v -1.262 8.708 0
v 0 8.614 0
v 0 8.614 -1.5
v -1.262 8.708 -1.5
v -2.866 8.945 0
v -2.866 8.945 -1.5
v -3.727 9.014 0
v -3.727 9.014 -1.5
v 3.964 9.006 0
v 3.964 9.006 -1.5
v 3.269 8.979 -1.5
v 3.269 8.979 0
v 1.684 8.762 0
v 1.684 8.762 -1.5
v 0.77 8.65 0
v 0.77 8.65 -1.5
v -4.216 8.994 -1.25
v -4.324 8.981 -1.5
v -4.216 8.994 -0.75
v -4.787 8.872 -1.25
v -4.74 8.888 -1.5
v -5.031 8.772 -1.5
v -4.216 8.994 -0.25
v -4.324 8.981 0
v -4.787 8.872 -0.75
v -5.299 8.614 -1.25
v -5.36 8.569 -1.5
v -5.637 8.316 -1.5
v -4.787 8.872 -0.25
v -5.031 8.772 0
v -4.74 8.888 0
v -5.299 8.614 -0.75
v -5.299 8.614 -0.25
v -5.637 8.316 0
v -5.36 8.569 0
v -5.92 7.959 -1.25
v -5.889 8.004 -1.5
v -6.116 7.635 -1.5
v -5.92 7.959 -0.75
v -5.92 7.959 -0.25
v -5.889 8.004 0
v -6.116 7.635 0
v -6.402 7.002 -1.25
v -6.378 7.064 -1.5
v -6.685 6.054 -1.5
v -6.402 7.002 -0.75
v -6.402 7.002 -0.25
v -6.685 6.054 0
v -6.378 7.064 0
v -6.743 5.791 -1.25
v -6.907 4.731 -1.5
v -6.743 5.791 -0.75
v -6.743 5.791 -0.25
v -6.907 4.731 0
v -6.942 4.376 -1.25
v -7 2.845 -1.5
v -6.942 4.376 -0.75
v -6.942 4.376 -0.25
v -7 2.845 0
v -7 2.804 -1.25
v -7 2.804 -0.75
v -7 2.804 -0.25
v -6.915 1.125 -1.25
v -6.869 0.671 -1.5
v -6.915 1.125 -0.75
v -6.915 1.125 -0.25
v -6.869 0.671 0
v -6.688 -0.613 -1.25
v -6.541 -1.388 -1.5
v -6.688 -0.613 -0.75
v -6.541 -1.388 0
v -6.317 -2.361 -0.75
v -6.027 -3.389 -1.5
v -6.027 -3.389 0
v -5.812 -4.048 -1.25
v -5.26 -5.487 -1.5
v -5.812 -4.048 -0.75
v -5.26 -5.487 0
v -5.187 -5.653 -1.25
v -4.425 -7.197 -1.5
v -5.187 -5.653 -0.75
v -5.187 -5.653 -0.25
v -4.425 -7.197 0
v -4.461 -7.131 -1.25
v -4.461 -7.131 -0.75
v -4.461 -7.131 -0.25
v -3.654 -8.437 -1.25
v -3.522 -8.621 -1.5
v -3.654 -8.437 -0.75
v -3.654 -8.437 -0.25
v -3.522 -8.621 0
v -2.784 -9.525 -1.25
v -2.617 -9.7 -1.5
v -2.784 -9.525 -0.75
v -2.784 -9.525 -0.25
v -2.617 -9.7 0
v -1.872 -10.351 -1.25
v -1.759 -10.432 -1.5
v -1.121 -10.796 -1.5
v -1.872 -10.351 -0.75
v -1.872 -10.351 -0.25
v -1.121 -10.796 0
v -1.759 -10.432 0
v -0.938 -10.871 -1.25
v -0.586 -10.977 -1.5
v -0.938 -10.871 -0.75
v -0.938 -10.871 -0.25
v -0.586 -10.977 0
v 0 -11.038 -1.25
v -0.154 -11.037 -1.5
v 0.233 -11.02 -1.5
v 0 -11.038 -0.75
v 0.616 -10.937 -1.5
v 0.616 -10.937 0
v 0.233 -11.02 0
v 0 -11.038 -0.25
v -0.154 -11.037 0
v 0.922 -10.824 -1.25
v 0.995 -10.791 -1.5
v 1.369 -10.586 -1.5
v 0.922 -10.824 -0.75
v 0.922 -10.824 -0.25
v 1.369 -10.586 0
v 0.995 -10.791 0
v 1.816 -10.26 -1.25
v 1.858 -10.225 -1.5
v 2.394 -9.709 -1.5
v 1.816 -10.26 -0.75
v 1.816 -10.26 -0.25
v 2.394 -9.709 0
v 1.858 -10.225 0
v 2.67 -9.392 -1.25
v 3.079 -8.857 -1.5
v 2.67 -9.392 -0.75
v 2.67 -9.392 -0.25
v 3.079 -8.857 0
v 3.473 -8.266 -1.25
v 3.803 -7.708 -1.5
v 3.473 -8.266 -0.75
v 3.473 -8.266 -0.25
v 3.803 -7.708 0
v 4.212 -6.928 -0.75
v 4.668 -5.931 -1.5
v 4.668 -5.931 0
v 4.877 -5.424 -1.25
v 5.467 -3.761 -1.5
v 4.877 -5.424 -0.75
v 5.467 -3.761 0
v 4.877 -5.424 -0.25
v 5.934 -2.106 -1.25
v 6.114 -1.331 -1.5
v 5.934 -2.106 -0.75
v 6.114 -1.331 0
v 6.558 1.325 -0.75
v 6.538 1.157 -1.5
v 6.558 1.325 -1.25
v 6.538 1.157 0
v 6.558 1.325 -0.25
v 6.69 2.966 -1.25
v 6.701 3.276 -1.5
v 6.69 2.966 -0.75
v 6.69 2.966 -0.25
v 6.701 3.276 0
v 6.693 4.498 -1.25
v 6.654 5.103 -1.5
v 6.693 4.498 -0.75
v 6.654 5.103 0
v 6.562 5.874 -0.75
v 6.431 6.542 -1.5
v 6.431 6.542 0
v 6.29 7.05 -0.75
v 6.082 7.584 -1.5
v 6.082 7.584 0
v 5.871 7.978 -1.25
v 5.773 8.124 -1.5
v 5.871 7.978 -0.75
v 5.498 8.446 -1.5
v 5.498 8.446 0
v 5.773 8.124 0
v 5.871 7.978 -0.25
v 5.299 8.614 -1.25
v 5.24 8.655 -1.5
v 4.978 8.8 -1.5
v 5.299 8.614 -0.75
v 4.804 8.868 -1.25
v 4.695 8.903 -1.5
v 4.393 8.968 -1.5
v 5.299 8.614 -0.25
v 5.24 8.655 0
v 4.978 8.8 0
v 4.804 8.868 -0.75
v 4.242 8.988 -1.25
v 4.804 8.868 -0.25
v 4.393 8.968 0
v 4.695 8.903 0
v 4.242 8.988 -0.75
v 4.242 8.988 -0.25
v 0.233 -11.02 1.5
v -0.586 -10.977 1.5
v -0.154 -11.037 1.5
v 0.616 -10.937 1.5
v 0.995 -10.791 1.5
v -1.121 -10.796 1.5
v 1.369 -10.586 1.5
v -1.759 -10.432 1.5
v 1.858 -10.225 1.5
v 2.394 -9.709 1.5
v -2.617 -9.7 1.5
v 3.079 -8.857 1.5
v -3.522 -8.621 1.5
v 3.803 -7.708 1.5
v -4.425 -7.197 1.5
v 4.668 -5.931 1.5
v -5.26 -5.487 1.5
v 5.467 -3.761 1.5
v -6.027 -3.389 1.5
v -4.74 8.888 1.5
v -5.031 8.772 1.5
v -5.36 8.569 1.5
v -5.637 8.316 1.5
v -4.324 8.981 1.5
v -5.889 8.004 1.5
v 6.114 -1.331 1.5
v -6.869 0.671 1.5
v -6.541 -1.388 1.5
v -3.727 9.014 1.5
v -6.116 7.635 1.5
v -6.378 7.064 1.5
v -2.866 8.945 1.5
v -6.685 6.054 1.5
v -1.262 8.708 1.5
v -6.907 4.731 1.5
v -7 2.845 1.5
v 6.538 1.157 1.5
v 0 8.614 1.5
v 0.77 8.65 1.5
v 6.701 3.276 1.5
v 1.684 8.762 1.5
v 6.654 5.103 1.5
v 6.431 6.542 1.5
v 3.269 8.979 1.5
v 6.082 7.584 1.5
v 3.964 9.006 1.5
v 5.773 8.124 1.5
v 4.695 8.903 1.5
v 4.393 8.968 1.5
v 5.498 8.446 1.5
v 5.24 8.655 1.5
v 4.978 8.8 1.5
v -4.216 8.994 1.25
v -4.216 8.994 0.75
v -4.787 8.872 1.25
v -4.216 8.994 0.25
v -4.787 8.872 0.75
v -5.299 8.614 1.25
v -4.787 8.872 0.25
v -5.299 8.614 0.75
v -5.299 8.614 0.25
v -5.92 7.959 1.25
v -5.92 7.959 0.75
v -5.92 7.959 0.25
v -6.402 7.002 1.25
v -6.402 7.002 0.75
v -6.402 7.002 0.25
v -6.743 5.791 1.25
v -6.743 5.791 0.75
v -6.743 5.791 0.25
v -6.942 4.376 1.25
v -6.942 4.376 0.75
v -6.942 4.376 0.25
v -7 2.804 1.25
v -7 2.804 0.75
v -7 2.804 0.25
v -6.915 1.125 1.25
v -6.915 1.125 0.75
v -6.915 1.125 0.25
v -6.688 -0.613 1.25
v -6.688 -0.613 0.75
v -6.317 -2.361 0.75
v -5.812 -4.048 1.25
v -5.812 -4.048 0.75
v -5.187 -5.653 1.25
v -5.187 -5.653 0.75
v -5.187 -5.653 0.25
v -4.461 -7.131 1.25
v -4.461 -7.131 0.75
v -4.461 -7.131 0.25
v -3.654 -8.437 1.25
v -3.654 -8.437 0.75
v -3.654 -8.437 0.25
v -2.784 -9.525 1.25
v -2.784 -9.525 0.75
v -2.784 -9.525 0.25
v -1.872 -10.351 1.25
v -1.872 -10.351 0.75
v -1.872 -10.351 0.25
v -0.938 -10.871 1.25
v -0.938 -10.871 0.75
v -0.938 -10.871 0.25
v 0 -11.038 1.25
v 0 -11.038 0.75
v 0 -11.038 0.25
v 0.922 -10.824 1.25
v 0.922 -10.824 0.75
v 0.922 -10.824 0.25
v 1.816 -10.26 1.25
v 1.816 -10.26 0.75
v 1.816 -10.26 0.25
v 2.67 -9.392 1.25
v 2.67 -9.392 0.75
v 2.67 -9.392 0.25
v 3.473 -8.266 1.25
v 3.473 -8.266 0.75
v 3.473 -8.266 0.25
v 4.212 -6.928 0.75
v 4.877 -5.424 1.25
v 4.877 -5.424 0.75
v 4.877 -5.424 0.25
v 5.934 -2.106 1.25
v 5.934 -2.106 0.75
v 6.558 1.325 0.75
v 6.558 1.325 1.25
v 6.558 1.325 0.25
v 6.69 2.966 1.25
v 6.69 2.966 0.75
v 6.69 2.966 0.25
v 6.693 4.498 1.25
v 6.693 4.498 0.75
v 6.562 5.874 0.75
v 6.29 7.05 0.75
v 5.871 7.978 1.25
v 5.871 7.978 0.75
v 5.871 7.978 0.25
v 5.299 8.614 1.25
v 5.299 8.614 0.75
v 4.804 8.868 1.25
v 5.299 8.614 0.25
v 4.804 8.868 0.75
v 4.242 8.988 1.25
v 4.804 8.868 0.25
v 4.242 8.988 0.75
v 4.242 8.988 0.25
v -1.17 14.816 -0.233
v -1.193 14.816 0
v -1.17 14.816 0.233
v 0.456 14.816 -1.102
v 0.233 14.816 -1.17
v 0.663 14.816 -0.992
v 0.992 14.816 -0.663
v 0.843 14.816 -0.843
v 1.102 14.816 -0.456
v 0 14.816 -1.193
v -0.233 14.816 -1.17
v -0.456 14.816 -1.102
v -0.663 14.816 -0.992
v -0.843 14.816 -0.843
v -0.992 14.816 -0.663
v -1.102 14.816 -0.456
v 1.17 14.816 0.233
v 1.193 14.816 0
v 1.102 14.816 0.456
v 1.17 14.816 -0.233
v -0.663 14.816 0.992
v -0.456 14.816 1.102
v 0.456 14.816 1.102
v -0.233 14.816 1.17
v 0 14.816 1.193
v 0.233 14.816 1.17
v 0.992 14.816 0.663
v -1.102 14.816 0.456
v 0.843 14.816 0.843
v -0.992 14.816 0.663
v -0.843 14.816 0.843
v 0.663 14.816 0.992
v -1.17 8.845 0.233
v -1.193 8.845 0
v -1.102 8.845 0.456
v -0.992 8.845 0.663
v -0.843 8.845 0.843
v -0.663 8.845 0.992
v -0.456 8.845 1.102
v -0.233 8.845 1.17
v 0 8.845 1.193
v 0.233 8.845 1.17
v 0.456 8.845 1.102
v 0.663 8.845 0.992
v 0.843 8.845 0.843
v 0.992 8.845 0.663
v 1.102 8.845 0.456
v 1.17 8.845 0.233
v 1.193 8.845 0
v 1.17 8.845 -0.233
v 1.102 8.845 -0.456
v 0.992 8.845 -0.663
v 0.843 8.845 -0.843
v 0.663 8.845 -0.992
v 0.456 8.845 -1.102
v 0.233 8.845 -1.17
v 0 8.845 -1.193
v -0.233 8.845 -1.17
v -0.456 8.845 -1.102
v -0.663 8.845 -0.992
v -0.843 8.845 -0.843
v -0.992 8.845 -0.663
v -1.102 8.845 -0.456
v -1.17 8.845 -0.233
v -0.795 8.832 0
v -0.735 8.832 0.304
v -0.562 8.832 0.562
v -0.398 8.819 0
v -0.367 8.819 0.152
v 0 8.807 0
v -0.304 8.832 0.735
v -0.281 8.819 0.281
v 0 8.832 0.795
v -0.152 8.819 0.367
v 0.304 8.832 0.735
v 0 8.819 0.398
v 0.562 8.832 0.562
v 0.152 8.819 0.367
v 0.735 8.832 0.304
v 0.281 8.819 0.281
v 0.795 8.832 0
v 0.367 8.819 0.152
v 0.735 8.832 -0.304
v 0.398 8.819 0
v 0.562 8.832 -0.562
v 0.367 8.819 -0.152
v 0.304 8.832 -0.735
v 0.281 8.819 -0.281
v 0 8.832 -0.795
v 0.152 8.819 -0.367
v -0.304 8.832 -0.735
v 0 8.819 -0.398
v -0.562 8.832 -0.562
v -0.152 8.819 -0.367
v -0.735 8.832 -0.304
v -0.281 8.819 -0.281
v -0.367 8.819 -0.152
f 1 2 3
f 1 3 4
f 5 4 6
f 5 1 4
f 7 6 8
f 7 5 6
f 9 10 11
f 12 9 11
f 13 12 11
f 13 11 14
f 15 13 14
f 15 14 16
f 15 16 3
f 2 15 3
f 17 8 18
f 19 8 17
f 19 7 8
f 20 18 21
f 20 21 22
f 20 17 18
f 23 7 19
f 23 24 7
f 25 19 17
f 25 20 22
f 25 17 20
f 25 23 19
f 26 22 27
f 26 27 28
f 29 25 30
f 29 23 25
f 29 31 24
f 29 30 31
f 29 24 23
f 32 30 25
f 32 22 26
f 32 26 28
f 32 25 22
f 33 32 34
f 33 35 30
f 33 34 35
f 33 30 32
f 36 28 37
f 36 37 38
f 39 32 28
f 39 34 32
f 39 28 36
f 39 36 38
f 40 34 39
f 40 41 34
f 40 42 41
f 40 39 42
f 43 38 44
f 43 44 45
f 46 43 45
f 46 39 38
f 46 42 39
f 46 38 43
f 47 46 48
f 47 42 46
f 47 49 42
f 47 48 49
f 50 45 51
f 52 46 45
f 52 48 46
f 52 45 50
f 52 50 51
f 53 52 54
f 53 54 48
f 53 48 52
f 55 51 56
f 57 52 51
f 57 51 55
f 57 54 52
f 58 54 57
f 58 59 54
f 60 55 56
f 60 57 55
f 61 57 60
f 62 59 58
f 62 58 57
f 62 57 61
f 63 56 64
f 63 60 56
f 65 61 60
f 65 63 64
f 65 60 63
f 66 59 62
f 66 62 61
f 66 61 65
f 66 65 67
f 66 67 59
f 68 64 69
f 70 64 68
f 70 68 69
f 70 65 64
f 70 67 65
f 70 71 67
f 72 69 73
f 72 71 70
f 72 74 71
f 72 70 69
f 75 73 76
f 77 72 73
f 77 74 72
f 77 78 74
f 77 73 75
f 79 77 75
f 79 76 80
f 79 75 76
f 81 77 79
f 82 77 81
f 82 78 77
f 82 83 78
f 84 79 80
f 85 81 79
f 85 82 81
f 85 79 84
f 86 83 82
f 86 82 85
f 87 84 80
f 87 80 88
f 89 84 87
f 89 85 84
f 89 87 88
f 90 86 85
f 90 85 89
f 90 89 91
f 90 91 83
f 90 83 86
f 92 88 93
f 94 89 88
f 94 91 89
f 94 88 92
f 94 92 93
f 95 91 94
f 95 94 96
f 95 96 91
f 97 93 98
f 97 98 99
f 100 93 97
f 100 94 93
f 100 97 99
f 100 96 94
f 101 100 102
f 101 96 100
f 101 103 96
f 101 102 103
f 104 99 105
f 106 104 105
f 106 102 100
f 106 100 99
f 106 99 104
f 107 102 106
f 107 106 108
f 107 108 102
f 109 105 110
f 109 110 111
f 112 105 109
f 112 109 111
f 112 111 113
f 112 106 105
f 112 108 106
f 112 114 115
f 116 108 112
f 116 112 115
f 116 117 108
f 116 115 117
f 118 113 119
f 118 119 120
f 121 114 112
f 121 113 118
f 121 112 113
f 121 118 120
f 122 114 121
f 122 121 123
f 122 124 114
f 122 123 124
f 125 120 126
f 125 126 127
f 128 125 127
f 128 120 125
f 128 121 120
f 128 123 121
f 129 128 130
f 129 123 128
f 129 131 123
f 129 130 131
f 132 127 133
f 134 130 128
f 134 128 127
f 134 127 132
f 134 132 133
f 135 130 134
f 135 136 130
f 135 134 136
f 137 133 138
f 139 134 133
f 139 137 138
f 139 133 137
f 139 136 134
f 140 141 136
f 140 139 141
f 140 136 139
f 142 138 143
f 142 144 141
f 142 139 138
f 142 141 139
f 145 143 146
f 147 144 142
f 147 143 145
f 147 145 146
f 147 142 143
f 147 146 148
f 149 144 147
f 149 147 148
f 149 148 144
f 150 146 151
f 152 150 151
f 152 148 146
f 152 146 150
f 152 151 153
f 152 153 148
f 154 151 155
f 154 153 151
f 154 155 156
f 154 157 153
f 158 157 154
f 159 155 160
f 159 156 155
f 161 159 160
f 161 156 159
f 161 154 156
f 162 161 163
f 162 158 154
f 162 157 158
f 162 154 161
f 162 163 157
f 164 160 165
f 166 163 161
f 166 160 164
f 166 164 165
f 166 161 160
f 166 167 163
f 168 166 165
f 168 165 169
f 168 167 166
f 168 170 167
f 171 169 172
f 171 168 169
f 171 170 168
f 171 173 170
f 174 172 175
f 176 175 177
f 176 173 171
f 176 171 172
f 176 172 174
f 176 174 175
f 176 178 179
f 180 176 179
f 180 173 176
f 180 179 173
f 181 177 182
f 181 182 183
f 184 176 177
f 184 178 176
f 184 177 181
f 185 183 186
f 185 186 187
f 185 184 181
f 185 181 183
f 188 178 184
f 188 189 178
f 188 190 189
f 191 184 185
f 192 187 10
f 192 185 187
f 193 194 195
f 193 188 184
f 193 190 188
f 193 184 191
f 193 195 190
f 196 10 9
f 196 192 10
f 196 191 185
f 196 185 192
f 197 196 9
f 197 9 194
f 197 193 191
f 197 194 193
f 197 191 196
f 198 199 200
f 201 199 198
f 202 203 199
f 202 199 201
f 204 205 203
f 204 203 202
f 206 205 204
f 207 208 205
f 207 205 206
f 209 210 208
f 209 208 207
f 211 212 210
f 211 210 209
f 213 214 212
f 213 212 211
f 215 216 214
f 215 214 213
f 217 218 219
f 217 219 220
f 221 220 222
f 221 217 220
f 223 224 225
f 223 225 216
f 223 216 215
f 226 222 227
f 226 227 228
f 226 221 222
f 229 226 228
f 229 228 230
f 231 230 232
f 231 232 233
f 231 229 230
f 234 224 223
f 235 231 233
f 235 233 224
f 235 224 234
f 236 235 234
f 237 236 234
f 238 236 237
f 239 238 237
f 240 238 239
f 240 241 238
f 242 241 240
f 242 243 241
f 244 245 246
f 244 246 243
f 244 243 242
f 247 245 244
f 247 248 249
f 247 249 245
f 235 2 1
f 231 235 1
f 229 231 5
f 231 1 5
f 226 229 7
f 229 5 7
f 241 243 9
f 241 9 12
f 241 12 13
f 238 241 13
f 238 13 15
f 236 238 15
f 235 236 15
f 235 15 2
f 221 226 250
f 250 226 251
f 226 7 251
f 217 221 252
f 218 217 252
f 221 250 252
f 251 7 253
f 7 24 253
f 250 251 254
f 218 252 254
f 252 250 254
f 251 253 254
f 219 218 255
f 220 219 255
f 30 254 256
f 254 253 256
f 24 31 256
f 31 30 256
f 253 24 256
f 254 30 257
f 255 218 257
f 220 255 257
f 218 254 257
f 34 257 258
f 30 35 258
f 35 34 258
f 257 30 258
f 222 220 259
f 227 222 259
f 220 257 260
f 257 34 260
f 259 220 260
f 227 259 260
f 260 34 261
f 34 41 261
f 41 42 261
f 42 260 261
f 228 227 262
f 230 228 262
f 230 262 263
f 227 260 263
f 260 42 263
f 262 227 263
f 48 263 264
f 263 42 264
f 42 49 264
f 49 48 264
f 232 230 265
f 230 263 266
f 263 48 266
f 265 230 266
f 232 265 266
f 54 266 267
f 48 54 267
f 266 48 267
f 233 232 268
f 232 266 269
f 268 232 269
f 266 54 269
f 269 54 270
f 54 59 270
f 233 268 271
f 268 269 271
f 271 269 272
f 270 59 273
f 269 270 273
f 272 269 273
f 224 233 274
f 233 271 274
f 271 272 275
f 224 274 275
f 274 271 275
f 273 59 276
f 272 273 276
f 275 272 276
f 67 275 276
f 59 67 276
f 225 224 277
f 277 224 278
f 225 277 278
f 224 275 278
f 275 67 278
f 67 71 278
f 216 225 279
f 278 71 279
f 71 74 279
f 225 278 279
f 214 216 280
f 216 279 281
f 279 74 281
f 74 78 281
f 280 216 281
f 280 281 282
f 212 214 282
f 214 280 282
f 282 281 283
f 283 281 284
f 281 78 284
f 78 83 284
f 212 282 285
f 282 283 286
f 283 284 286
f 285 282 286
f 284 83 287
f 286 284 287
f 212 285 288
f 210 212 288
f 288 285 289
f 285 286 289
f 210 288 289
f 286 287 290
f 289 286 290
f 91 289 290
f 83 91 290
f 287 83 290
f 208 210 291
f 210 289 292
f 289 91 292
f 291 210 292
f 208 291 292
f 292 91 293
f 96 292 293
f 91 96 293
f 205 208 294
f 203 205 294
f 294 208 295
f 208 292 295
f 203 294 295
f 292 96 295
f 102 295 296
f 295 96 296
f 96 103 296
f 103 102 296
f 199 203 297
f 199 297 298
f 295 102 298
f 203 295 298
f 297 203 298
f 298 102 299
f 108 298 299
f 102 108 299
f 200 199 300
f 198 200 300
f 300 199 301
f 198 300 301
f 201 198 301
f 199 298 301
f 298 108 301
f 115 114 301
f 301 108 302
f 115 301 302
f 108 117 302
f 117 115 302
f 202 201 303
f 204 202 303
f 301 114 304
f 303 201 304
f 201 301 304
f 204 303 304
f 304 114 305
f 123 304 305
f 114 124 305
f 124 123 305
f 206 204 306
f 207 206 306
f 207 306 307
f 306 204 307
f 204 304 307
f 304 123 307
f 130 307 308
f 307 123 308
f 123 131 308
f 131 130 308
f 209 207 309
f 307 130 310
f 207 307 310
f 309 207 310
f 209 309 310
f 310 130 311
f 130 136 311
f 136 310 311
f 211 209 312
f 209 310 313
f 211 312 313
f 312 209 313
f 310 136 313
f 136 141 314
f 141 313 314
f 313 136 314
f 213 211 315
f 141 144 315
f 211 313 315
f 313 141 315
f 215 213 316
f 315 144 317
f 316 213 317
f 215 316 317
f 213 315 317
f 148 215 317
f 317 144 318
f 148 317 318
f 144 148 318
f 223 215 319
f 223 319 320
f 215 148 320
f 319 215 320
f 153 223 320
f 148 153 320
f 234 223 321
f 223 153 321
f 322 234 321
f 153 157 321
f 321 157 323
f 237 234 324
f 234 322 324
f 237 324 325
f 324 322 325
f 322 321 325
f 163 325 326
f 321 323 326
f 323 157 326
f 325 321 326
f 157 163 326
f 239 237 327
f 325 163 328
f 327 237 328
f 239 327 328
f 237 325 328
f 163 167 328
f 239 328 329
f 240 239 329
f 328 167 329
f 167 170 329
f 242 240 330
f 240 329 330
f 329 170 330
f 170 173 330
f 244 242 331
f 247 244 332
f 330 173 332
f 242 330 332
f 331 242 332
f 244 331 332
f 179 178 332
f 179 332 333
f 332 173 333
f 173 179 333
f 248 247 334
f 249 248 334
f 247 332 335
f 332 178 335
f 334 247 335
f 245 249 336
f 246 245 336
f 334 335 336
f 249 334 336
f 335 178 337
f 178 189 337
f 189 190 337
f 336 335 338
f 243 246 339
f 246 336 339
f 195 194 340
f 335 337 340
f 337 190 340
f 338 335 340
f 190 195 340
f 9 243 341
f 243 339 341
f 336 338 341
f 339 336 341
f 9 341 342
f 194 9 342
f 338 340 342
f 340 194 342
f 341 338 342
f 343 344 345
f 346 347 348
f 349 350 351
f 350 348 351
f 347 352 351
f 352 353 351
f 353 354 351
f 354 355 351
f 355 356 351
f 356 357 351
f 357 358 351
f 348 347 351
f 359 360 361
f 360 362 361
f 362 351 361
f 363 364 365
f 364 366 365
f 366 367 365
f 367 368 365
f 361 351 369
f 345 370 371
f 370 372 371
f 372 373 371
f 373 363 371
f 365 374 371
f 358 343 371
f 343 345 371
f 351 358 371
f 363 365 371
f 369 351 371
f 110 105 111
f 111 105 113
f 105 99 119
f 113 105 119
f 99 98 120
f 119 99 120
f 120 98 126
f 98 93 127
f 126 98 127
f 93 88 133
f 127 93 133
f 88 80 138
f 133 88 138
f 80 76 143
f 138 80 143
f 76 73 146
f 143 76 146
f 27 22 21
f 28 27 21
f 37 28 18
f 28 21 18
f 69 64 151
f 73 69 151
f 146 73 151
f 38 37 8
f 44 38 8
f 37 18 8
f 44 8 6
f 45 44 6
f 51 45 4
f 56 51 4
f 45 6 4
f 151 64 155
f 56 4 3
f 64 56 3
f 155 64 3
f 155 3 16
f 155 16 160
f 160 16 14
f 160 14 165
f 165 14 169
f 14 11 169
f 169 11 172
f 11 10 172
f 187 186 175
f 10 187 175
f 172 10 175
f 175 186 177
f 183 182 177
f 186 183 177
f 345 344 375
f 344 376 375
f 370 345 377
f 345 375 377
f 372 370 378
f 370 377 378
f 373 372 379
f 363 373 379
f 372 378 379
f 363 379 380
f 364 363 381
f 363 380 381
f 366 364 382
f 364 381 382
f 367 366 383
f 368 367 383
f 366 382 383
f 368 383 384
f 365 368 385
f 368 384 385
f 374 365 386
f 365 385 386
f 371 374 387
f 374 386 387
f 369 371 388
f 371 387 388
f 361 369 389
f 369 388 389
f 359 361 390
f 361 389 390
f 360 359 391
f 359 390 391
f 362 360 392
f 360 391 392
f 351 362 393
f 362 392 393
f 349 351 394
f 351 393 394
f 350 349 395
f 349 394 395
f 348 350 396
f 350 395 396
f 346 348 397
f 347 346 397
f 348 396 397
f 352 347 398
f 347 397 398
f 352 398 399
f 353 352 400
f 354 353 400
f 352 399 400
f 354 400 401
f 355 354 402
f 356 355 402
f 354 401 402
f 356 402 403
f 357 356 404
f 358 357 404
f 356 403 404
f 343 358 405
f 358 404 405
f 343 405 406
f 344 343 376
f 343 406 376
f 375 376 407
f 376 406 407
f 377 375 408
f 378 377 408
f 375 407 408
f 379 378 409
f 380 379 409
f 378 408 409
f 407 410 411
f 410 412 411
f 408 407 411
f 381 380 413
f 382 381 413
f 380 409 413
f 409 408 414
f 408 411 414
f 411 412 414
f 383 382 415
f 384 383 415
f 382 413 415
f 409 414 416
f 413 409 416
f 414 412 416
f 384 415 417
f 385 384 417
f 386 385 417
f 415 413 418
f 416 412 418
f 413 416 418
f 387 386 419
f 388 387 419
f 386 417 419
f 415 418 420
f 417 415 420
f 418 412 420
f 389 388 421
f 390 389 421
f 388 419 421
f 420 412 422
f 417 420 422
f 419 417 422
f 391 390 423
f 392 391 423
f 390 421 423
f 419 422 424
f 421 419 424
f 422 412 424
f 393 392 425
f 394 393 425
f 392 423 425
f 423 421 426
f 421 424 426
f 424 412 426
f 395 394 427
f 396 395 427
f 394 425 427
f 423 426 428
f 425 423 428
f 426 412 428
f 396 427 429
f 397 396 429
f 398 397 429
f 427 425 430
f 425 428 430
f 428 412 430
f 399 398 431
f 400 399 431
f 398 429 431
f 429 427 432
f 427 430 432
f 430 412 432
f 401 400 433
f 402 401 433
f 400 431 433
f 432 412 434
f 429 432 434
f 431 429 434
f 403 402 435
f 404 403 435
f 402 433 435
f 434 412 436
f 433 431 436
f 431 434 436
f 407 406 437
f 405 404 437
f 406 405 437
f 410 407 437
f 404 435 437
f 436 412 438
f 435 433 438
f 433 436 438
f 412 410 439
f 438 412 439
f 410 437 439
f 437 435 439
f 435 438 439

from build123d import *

# Parameters (mm, degrees)
F1_DEPTH = 1.5


with BuildPart() as f1:
    # F0 (on Top) → F1 (new body, symmetric)
    with BuildSketch(Plane.XY):
        with BuildLine():
            add(Edge.make_bspline(
                [(0, 8.6135165766), (-2.0250481209, 8.616765204), (-6.8967533798, 10.8101850303), (-7.848943545, -2.7059601844), (0.1745451704, -15.2681209722), (7.1093377805, -2.391643729), (7.0062214265, 10.7711720497), (2.0250481209, 8.6102679492), (0, 8.6135165766)],
                knots=[0, 0, 0, 0, 0.1296742012, 0.3166938332, 0.5012497625, 0.6857273739, 0.8703257988, 1, 1, 1, 1], degree=3))
        make_face()
    extrude(amount=F1_DEPTH, both=True)


with BuildPart() as f3:
    # F2 (on Top) → F3 (revolve)
    with BuildSketch(Plane.XY):
        Polygon((-1.1927433661, 14.8156252918), (-1.1927433661, 8.8450885607), (0, 8.806612716), (0, 14.8156252918), align=None)
    revolve(axis=Axis((0, 11.8111190039, 0), (0, 1, 0)))


solid = Compound([f1.part, f3.part])
